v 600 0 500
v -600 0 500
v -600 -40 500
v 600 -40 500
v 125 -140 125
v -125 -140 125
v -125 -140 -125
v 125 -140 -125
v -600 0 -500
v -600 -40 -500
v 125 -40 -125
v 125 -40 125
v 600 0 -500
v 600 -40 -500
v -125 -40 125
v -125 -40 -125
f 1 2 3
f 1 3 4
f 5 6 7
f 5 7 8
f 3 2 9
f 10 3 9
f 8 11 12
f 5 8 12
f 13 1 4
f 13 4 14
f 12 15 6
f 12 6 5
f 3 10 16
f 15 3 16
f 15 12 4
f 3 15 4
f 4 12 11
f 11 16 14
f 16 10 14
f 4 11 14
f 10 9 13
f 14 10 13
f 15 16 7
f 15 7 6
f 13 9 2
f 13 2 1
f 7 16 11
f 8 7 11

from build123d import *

# Parameters (mm, degrees)
ESQUISSE1_W        = 1200
ESQUISSE1_H        = 1000
BOSS_EXTRU_1_DEPTH = 40
ESQUISSE2_W        = 250
ESQUISSE2_H        = 250
BOSS_EXTRU_2_DEPTH = 100


with BuildPart() as part:
    # Esquisse1 → Boss.-Extru.1 (new body)
    with BuildSketch(Plane(origin=(0, 0, 0), x_dir=(1, 0, 0), z_dir=(0, 1, 0))):
        Rectangle(ESQUISSE1_W, ESQUISSE1_H)
    extrude(amount=-BOSS_EXTRU_1_DEPTH)

    # Esquisse2 → Boss.-Extru.2 (add)
    with BuildSketch(Plane.XZ.offset(40)):
        Rectangle(ESQUISSE2_W, ESQUISSE2_H)
    extrude(amount=BOSS_EXTRU_2_DEPTH)


solid = part.part
